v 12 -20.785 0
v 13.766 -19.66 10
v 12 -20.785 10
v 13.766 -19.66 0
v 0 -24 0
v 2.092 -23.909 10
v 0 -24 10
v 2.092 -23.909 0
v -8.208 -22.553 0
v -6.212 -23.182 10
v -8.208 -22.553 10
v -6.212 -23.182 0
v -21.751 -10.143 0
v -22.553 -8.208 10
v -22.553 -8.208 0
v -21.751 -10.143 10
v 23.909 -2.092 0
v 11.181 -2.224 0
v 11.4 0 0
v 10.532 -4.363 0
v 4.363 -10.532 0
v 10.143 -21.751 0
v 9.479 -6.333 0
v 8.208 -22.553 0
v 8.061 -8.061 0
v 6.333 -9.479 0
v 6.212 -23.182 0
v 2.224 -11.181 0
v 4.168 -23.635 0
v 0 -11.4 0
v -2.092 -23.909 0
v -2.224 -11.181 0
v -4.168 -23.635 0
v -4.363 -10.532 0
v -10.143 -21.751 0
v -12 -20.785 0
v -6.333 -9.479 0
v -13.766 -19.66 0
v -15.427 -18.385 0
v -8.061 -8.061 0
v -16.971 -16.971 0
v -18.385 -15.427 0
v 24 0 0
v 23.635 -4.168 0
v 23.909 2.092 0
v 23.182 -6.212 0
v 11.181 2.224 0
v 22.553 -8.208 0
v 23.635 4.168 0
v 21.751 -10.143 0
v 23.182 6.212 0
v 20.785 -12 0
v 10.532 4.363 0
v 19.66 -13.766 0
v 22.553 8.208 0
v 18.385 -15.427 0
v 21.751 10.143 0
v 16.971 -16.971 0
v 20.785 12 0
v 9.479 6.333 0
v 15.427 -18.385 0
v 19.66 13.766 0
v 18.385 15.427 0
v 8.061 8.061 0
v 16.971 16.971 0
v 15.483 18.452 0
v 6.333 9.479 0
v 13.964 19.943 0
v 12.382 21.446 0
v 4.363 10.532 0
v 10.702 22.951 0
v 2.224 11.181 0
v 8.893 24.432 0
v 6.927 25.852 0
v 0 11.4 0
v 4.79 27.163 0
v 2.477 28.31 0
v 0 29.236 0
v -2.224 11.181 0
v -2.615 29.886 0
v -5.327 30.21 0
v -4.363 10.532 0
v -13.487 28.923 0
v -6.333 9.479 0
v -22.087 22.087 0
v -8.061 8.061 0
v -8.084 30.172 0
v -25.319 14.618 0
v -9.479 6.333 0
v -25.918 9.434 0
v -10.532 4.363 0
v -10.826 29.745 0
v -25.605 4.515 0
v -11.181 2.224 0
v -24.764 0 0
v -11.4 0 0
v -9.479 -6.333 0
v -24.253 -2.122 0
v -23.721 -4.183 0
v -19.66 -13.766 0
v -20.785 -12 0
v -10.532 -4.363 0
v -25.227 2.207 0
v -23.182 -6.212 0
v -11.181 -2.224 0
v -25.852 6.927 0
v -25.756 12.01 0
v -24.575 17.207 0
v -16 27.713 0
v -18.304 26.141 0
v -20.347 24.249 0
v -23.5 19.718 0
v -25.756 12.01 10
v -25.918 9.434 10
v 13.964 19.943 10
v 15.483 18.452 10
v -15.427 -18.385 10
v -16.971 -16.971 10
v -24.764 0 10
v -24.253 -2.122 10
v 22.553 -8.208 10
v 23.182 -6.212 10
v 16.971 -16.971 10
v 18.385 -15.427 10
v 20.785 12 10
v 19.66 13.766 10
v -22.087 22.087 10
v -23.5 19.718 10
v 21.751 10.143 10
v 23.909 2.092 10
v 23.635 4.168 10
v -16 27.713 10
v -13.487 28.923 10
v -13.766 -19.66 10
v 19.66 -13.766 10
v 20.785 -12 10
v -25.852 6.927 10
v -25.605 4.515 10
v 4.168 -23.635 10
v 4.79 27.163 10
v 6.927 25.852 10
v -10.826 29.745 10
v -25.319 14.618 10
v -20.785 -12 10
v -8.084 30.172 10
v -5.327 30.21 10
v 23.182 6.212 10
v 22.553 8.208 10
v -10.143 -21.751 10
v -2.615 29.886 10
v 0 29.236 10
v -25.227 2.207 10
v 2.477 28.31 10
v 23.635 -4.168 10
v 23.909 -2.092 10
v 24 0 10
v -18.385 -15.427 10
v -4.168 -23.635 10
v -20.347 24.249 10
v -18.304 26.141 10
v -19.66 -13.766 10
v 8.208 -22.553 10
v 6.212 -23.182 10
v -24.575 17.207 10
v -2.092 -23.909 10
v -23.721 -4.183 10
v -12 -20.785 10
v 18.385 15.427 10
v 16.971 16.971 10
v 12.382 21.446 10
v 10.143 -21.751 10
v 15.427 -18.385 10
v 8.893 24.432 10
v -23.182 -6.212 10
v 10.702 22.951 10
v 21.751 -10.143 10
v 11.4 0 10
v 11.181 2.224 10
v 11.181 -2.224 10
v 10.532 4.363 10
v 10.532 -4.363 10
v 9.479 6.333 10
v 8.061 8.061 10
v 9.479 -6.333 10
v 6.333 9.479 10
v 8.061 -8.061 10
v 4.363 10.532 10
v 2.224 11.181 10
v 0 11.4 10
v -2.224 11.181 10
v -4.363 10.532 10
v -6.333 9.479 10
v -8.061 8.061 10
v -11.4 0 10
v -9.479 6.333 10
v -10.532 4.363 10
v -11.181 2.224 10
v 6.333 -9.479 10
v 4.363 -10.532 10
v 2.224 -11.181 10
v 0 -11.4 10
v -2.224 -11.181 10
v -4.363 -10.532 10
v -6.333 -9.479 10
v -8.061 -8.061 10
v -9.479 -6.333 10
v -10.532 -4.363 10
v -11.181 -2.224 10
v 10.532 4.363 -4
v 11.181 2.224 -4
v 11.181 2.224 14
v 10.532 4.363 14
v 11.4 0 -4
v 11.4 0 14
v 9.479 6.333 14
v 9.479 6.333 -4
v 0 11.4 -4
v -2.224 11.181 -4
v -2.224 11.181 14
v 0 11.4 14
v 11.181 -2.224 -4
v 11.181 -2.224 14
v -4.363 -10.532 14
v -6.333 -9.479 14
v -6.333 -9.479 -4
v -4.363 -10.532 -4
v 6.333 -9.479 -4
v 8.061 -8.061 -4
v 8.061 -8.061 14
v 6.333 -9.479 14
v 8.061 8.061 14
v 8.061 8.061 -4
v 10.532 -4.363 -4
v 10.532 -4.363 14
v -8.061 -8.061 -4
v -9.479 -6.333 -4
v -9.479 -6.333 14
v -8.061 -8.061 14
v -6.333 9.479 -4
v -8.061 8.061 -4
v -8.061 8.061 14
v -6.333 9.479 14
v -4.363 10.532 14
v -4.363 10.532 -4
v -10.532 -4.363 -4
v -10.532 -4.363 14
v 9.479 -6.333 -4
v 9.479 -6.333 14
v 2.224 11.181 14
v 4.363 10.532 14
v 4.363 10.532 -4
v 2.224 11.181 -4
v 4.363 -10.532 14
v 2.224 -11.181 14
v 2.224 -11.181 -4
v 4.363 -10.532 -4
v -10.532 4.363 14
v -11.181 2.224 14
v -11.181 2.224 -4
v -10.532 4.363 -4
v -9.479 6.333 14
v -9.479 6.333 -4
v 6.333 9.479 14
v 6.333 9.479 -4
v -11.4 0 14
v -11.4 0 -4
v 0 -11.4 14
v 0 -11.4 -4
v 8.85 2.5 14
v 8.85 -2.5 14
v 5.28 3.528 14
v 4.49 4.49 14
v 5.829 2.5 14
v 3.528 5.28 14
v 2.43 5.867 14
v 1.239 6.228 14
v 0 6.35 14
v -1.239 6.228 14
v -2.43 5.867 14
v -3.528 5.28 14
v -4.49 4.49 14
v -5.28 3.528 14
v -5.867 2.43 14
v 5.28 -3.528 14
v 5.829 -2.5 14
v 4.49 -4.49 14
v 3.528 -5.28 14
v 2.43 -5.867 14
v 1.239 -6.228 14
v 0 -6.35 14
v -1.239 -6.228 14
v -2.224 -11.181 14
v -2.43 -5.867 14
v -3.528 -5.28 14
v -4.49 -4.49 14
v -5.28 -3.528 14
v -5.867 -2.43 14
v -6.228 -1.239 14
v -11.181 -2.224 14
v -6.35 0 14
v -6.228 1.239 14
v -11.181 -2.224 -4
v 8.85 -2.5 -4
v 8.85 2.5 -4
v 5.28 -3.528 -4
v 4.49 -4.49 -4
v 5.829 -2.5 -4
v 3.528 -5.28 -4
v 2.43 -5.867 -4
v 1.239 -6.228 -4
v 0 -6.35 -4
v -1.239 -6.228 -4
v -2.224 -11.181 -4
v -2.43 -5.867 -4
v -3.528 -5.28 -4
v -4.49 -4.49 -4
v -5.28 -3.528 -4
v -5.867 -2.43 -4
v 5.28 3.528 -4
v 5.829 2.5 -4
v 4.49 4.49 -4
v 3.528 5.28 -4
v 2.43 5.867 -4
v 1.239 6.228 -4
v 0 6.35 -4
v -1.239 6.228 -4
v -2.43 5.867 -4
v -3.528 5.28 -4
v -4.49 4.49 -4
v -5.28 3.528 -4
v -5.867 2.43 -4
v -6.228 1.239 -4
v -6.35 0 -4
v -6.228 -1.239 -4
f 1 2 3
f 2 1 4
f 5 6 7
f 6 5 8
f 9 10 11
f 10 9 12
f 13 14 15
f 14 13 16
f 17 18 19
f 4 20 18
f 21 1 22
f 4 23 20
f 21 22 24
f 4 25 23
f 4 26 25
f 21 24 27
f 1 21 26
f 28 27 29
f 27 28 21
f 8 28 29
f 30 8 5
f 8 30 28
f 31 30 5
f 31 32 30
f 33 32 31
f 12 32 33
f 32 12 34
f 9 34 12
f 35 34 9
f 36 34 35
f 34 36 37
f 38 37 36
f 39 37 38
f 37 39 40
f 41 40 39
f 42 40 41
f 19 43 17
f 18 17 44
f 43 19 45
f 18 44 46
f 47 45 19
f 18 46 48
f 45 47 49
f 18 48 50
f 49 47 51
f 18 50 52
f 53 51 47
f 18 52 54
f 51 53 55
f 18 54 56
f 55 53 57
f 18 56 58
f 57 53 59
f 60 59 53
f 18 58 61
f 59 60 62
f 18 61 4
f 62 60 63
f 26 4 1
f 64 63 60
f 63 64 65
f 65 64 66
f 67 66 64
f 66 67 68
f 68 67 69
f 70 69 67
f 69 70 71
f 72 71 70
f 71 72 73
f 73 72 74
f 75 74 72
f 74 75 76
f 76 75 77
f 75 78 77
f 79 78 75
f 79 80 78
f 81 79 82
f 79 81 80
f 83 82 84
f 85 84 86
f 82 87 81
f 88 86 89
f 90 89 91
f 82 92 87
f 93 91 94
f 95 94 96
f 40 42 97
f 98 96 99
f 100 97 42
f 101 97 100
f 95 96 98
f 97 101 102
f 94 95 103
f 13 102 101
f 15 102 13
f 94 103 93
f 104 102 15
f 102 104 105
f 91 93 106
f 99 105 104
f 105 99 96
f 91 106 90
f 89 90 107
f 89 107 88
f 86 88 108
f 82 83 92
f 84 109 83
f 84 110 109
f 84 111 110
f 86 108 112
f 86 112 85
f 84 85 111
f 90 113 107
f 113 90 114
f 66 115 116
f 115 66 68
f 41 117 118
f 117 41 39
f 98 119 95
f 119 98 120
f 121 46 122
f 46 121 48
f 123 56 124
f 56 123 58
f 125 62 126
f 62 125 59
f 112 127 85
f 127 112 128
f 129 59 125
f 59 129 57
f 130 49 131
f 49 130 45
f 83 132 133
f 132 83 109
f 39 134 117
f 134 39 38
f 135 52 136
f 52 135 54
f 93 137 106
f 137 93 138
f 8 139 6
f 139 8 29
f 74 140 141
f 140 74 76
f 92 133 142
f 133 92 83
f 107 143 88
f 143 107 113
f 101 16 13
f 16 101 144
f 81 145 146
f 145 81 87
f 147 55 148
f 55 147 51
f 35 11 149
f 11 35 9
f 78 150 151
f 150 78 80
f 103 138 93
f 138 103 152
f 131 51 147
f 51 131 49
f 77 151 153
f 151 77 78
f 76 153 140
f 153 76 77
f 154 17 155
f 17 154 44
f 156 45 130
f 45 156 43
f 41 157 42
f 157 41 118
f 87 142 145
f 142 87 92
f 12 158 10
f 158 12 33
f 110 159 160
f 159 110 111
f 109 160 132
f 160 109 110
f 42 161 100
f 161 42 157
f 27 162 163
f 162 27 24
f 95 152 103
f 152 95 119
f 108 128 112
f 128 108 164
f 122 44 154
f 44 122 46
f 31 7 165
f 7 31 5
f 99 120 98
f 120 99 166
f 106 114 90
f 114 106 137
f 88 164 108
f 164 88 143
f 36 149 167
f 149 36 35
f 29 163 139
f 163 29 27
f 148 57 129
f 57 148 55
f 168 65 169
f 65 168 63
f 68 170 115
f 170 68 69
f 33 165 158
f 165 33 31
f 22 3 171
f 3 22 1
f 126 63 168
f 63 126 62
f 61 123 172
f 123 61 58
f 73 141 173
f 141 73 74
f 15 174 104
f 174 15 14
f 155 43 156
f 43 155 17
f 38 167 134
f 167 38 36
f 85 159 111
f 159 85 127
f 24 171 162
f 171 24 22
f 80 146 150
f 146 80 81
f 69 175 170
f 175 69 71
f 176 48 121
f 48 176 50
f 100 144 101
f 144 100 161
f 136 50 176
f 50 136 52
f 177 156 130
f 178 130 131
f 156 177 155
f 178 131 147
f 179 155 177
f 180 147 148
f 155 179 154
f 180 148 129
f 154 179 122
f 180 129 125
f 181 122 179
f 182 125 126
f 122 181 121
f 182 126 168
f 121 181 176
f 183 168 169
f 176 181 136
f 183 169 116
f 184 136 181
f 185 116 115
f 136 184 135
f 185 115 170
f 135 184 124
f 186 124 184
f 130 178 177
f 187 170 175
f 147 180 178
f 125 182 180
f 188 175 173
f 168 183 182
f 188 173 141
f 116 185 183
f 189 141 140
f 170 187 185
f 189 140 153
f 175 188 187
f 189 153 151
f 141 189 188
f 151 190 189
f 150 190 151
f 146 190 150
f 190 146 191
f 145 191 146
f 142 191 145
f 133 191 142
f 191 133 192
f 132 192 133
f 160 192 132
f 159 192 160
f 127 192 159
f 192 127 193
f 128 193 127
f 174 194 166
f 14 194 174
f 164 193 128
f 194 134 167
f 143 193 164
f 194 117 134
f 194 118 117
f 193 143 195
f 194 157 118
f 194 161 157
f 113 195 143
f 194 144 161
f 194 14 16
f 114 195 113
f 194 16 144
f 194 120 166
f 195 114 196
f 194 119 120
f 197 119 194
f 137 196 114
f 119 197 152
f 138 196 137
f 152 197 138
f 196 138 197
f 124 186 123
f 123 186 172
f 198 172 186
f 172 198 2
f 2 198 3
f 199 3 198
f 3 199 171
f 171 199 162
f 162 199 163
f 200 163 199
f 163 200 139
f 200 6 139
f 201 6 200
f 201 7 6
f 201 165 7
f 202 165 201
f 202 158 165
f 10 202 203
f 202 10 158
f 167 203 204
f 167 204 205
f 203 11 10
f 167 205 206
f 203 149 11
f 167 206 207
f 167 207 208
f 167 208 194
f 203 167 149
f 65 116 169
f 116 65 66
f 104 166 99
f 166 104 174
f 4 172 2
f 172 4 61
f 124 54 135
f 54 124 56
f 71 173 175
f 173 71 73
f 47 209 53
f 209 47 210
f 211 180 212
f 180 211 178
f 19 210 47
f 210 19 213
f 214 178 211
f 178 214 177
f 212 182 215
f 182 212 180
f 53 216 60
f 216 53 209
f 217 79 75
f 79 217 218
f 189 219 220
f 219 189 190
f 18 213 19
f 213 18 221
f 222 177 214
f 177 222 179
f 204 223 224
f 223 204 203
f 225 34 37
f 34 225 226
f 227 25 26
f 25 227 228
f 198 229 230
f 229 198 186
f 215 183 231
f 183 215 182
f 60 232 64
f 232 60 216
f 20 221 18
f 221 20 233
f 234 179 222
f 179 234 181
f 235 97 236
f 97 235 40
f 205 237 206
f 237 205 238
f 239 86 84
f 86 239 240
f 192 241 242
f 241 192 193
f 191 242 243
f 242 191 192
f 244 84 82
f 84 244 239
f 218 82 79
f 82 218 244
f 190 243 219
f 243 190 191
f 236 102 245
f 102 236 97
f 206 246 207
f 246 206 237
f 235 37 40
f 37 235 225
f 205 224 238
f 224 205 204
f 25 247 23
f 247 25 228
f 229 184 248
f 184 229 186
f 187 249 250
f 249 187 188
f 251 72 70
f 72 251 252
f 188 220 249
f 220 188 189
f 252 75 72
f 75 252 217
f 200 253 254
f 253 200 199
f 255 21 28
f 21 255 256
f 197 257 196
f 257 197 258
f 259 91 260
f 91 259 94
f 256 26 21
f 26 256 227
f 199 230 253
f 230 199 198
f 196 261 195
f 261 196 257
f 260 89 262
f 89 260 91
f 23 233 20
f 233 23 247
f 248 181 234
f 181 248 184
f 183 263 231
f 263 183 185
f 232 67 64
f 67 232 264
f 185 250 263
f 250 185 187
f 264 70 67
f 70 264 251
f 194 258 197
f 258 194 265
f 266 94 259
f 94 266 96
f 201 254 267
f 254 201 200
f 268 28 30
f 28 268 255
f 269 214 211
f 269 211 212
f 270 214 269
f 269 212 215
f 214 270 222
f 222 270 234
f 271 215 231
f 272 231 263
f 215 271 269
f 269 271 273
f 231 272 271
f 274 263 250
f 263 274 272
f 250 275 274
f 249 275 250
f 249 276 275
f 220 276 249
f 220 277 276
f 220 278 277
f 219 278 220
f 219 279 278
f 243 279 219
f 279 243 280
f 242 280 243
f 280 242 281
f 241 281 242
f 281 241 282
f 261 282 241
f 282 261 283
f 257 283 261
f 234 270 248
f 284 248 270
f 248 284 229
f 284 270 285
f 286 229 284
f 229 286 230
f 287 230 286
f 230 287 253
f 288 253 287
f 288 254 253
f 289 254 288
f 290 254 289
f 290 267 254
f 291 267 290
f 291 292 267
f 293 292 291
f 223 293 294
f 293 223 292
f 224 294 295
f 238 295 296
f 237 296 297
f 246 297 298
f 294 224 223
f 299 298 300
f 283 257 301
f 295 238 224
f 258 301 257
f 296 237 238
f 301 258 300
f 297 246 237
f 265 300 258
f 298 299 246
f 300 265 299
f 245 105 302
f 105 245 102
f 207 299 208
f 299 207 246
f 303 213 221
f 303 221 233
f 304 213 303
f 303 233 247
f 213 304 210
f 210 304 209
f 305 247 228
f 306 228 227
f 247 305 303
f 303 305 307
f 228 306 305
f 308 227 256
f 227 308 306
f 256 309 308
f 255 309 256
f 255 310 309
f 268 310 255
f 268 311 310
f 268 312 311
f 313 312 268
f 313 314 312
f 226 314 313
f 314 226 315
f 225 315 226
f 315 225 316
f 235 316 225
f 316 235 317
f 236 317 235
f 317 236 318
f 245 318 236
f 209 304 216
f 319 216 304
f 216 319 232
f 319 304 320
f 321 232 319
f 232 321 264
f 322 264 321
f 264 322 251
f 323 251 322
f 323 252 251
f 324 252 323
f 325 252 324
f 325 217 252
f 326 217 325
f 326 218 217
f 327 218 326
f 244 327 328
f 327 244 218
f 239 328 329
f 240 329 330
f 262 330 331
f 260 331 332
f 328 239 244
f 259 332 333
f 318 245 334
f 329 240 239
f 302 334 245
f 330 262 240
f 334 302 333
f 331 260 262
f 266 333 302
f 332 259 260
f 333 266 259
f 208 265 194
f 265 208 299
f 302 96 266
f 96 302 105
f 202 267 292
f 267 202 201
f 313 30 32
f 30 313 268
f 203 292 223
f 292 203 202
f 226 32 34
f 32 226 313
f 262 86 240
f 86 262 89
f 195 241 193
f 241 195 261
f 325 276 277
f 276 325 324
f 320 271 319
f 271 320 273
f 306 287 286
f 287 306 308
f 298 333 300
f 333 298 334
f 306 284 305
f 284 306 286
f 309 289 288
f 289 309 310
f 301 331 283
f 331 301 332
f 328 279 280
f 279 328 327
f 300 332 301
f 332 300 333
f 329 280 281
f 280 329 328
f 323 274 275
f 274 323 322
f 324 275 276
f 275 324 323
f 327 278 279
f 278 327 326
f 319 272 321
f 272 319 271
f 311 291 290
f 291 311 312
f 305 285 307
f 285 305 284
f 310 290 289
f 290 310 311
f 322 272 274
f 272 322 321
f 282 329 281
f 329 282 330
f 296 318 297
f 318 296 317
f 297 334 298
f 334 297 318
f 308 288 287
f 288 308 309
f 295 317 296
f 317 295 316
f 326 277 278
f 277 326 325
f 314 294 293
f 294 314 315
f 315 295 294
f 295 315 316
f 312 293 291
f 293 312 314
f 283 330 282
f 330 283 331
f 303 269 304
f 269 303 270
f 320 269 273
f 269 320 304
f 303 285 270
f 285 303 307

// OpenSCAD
$fn = 32;

// ----------------------------------------------------------------------
// Cam: base radius 24 mm with a 8 mm lift over 150 degrees
// ----------------------------------------------------------------------

// --- parameters (mm) ---
base_r = 24;              // base radius
lift = 8;                 // lift height above the base radius
lift_span = 150;          // angular width of the lift
lift_start = 45;          // angle where the lift starts
cam_t = 10;               // cam plate thickness
hub_d = 22.8;             // hub diameter
hub_h = 18;               // hub height
bore_d = 12.7;            // bore
key_w = 5;                // keyway width
key_depth = 2.5;          // keyway depth

cam_profile = [[24, 0], [23.909, 2.092], [23.635, 4.168], [23.182, 6.212], [22.553, 8.208], [21.751, 10.143], [20.785, 12], [19.66, 13.766], [18.385, 15.427], [16.971, 16.971], [15.483, 18.452], [13.964, 19.943], [12.382, 21.446], [10.702, 22.951], [8.893, 24.432], [6.927, 25.852], [4.79, 27.163], [2.477, 28.31], [0, 29.236], [-2.615, 29.886], [-5.327, 30.21], [-8.084, 30.172], [-10.826, 29.745], [-13.487, 28.923], [-16, 27.713], [-18.304, 26.141], [-20.347, 24.249], [-22.087, 22.087], [-23.5, 19.718], [-24.575, 17.207], [-25.319, 14.618], [-25.756, 12.01], [-25.918, 9.434], [-25.852, 6.927], [-25.605, 4.515], [-25.227, 2.207], [-24.764, 0], [-24.253, -2.122], [-23.721, -4.183], [-23.182, -6.212], [-22.553, -8.208], [-21.751, -10.143], [-20.785, -12], [-19.66, -13.766], [-18.385, -15.427], [-16.971, -16.971], [-15.427, -18.385], [-13.766, -19.66], [-12, -20.785], [-10.143, -21.751], [-8.208, -22.553], [-6.212, -23.182], [-4.168, -23.635], [-2.092, -23.909], [0, -24], [2.092, -23.909], [4.168, -23.635], [6.212, -23.182], [8.208, -22.553], [10.143, -21.751], [12, -20.785], [13.766, -19.66], [15.427, -18.385], [16.971, -16.971], [18.385, -15.427], [19.66, -13.766], [20.785, -12], [21.751, -10.143], [22.553, -8.208], [23.182, -6.212], [23.635, -4.168], [23.909, -2.092]];

difference() {
  union() {
    linear_extrude(height = cam_t) polygon(cam_profile);
    /* hub, proud of the cam plate on both sides */
    translate([0, 0, -4]) cylinder(h = hub_h, d = hub_d);
  }
  /* bore through the hub, 2.5 mm clear on both faces */
  translate([0, 0, -6.5]) cylinder(h = hub_h + 5, d = bore_d);
  /* keyway, milled through the whole hub */
  translate([3.85, -2.5, -6.5]) cube([5, 5, 23]);
}
